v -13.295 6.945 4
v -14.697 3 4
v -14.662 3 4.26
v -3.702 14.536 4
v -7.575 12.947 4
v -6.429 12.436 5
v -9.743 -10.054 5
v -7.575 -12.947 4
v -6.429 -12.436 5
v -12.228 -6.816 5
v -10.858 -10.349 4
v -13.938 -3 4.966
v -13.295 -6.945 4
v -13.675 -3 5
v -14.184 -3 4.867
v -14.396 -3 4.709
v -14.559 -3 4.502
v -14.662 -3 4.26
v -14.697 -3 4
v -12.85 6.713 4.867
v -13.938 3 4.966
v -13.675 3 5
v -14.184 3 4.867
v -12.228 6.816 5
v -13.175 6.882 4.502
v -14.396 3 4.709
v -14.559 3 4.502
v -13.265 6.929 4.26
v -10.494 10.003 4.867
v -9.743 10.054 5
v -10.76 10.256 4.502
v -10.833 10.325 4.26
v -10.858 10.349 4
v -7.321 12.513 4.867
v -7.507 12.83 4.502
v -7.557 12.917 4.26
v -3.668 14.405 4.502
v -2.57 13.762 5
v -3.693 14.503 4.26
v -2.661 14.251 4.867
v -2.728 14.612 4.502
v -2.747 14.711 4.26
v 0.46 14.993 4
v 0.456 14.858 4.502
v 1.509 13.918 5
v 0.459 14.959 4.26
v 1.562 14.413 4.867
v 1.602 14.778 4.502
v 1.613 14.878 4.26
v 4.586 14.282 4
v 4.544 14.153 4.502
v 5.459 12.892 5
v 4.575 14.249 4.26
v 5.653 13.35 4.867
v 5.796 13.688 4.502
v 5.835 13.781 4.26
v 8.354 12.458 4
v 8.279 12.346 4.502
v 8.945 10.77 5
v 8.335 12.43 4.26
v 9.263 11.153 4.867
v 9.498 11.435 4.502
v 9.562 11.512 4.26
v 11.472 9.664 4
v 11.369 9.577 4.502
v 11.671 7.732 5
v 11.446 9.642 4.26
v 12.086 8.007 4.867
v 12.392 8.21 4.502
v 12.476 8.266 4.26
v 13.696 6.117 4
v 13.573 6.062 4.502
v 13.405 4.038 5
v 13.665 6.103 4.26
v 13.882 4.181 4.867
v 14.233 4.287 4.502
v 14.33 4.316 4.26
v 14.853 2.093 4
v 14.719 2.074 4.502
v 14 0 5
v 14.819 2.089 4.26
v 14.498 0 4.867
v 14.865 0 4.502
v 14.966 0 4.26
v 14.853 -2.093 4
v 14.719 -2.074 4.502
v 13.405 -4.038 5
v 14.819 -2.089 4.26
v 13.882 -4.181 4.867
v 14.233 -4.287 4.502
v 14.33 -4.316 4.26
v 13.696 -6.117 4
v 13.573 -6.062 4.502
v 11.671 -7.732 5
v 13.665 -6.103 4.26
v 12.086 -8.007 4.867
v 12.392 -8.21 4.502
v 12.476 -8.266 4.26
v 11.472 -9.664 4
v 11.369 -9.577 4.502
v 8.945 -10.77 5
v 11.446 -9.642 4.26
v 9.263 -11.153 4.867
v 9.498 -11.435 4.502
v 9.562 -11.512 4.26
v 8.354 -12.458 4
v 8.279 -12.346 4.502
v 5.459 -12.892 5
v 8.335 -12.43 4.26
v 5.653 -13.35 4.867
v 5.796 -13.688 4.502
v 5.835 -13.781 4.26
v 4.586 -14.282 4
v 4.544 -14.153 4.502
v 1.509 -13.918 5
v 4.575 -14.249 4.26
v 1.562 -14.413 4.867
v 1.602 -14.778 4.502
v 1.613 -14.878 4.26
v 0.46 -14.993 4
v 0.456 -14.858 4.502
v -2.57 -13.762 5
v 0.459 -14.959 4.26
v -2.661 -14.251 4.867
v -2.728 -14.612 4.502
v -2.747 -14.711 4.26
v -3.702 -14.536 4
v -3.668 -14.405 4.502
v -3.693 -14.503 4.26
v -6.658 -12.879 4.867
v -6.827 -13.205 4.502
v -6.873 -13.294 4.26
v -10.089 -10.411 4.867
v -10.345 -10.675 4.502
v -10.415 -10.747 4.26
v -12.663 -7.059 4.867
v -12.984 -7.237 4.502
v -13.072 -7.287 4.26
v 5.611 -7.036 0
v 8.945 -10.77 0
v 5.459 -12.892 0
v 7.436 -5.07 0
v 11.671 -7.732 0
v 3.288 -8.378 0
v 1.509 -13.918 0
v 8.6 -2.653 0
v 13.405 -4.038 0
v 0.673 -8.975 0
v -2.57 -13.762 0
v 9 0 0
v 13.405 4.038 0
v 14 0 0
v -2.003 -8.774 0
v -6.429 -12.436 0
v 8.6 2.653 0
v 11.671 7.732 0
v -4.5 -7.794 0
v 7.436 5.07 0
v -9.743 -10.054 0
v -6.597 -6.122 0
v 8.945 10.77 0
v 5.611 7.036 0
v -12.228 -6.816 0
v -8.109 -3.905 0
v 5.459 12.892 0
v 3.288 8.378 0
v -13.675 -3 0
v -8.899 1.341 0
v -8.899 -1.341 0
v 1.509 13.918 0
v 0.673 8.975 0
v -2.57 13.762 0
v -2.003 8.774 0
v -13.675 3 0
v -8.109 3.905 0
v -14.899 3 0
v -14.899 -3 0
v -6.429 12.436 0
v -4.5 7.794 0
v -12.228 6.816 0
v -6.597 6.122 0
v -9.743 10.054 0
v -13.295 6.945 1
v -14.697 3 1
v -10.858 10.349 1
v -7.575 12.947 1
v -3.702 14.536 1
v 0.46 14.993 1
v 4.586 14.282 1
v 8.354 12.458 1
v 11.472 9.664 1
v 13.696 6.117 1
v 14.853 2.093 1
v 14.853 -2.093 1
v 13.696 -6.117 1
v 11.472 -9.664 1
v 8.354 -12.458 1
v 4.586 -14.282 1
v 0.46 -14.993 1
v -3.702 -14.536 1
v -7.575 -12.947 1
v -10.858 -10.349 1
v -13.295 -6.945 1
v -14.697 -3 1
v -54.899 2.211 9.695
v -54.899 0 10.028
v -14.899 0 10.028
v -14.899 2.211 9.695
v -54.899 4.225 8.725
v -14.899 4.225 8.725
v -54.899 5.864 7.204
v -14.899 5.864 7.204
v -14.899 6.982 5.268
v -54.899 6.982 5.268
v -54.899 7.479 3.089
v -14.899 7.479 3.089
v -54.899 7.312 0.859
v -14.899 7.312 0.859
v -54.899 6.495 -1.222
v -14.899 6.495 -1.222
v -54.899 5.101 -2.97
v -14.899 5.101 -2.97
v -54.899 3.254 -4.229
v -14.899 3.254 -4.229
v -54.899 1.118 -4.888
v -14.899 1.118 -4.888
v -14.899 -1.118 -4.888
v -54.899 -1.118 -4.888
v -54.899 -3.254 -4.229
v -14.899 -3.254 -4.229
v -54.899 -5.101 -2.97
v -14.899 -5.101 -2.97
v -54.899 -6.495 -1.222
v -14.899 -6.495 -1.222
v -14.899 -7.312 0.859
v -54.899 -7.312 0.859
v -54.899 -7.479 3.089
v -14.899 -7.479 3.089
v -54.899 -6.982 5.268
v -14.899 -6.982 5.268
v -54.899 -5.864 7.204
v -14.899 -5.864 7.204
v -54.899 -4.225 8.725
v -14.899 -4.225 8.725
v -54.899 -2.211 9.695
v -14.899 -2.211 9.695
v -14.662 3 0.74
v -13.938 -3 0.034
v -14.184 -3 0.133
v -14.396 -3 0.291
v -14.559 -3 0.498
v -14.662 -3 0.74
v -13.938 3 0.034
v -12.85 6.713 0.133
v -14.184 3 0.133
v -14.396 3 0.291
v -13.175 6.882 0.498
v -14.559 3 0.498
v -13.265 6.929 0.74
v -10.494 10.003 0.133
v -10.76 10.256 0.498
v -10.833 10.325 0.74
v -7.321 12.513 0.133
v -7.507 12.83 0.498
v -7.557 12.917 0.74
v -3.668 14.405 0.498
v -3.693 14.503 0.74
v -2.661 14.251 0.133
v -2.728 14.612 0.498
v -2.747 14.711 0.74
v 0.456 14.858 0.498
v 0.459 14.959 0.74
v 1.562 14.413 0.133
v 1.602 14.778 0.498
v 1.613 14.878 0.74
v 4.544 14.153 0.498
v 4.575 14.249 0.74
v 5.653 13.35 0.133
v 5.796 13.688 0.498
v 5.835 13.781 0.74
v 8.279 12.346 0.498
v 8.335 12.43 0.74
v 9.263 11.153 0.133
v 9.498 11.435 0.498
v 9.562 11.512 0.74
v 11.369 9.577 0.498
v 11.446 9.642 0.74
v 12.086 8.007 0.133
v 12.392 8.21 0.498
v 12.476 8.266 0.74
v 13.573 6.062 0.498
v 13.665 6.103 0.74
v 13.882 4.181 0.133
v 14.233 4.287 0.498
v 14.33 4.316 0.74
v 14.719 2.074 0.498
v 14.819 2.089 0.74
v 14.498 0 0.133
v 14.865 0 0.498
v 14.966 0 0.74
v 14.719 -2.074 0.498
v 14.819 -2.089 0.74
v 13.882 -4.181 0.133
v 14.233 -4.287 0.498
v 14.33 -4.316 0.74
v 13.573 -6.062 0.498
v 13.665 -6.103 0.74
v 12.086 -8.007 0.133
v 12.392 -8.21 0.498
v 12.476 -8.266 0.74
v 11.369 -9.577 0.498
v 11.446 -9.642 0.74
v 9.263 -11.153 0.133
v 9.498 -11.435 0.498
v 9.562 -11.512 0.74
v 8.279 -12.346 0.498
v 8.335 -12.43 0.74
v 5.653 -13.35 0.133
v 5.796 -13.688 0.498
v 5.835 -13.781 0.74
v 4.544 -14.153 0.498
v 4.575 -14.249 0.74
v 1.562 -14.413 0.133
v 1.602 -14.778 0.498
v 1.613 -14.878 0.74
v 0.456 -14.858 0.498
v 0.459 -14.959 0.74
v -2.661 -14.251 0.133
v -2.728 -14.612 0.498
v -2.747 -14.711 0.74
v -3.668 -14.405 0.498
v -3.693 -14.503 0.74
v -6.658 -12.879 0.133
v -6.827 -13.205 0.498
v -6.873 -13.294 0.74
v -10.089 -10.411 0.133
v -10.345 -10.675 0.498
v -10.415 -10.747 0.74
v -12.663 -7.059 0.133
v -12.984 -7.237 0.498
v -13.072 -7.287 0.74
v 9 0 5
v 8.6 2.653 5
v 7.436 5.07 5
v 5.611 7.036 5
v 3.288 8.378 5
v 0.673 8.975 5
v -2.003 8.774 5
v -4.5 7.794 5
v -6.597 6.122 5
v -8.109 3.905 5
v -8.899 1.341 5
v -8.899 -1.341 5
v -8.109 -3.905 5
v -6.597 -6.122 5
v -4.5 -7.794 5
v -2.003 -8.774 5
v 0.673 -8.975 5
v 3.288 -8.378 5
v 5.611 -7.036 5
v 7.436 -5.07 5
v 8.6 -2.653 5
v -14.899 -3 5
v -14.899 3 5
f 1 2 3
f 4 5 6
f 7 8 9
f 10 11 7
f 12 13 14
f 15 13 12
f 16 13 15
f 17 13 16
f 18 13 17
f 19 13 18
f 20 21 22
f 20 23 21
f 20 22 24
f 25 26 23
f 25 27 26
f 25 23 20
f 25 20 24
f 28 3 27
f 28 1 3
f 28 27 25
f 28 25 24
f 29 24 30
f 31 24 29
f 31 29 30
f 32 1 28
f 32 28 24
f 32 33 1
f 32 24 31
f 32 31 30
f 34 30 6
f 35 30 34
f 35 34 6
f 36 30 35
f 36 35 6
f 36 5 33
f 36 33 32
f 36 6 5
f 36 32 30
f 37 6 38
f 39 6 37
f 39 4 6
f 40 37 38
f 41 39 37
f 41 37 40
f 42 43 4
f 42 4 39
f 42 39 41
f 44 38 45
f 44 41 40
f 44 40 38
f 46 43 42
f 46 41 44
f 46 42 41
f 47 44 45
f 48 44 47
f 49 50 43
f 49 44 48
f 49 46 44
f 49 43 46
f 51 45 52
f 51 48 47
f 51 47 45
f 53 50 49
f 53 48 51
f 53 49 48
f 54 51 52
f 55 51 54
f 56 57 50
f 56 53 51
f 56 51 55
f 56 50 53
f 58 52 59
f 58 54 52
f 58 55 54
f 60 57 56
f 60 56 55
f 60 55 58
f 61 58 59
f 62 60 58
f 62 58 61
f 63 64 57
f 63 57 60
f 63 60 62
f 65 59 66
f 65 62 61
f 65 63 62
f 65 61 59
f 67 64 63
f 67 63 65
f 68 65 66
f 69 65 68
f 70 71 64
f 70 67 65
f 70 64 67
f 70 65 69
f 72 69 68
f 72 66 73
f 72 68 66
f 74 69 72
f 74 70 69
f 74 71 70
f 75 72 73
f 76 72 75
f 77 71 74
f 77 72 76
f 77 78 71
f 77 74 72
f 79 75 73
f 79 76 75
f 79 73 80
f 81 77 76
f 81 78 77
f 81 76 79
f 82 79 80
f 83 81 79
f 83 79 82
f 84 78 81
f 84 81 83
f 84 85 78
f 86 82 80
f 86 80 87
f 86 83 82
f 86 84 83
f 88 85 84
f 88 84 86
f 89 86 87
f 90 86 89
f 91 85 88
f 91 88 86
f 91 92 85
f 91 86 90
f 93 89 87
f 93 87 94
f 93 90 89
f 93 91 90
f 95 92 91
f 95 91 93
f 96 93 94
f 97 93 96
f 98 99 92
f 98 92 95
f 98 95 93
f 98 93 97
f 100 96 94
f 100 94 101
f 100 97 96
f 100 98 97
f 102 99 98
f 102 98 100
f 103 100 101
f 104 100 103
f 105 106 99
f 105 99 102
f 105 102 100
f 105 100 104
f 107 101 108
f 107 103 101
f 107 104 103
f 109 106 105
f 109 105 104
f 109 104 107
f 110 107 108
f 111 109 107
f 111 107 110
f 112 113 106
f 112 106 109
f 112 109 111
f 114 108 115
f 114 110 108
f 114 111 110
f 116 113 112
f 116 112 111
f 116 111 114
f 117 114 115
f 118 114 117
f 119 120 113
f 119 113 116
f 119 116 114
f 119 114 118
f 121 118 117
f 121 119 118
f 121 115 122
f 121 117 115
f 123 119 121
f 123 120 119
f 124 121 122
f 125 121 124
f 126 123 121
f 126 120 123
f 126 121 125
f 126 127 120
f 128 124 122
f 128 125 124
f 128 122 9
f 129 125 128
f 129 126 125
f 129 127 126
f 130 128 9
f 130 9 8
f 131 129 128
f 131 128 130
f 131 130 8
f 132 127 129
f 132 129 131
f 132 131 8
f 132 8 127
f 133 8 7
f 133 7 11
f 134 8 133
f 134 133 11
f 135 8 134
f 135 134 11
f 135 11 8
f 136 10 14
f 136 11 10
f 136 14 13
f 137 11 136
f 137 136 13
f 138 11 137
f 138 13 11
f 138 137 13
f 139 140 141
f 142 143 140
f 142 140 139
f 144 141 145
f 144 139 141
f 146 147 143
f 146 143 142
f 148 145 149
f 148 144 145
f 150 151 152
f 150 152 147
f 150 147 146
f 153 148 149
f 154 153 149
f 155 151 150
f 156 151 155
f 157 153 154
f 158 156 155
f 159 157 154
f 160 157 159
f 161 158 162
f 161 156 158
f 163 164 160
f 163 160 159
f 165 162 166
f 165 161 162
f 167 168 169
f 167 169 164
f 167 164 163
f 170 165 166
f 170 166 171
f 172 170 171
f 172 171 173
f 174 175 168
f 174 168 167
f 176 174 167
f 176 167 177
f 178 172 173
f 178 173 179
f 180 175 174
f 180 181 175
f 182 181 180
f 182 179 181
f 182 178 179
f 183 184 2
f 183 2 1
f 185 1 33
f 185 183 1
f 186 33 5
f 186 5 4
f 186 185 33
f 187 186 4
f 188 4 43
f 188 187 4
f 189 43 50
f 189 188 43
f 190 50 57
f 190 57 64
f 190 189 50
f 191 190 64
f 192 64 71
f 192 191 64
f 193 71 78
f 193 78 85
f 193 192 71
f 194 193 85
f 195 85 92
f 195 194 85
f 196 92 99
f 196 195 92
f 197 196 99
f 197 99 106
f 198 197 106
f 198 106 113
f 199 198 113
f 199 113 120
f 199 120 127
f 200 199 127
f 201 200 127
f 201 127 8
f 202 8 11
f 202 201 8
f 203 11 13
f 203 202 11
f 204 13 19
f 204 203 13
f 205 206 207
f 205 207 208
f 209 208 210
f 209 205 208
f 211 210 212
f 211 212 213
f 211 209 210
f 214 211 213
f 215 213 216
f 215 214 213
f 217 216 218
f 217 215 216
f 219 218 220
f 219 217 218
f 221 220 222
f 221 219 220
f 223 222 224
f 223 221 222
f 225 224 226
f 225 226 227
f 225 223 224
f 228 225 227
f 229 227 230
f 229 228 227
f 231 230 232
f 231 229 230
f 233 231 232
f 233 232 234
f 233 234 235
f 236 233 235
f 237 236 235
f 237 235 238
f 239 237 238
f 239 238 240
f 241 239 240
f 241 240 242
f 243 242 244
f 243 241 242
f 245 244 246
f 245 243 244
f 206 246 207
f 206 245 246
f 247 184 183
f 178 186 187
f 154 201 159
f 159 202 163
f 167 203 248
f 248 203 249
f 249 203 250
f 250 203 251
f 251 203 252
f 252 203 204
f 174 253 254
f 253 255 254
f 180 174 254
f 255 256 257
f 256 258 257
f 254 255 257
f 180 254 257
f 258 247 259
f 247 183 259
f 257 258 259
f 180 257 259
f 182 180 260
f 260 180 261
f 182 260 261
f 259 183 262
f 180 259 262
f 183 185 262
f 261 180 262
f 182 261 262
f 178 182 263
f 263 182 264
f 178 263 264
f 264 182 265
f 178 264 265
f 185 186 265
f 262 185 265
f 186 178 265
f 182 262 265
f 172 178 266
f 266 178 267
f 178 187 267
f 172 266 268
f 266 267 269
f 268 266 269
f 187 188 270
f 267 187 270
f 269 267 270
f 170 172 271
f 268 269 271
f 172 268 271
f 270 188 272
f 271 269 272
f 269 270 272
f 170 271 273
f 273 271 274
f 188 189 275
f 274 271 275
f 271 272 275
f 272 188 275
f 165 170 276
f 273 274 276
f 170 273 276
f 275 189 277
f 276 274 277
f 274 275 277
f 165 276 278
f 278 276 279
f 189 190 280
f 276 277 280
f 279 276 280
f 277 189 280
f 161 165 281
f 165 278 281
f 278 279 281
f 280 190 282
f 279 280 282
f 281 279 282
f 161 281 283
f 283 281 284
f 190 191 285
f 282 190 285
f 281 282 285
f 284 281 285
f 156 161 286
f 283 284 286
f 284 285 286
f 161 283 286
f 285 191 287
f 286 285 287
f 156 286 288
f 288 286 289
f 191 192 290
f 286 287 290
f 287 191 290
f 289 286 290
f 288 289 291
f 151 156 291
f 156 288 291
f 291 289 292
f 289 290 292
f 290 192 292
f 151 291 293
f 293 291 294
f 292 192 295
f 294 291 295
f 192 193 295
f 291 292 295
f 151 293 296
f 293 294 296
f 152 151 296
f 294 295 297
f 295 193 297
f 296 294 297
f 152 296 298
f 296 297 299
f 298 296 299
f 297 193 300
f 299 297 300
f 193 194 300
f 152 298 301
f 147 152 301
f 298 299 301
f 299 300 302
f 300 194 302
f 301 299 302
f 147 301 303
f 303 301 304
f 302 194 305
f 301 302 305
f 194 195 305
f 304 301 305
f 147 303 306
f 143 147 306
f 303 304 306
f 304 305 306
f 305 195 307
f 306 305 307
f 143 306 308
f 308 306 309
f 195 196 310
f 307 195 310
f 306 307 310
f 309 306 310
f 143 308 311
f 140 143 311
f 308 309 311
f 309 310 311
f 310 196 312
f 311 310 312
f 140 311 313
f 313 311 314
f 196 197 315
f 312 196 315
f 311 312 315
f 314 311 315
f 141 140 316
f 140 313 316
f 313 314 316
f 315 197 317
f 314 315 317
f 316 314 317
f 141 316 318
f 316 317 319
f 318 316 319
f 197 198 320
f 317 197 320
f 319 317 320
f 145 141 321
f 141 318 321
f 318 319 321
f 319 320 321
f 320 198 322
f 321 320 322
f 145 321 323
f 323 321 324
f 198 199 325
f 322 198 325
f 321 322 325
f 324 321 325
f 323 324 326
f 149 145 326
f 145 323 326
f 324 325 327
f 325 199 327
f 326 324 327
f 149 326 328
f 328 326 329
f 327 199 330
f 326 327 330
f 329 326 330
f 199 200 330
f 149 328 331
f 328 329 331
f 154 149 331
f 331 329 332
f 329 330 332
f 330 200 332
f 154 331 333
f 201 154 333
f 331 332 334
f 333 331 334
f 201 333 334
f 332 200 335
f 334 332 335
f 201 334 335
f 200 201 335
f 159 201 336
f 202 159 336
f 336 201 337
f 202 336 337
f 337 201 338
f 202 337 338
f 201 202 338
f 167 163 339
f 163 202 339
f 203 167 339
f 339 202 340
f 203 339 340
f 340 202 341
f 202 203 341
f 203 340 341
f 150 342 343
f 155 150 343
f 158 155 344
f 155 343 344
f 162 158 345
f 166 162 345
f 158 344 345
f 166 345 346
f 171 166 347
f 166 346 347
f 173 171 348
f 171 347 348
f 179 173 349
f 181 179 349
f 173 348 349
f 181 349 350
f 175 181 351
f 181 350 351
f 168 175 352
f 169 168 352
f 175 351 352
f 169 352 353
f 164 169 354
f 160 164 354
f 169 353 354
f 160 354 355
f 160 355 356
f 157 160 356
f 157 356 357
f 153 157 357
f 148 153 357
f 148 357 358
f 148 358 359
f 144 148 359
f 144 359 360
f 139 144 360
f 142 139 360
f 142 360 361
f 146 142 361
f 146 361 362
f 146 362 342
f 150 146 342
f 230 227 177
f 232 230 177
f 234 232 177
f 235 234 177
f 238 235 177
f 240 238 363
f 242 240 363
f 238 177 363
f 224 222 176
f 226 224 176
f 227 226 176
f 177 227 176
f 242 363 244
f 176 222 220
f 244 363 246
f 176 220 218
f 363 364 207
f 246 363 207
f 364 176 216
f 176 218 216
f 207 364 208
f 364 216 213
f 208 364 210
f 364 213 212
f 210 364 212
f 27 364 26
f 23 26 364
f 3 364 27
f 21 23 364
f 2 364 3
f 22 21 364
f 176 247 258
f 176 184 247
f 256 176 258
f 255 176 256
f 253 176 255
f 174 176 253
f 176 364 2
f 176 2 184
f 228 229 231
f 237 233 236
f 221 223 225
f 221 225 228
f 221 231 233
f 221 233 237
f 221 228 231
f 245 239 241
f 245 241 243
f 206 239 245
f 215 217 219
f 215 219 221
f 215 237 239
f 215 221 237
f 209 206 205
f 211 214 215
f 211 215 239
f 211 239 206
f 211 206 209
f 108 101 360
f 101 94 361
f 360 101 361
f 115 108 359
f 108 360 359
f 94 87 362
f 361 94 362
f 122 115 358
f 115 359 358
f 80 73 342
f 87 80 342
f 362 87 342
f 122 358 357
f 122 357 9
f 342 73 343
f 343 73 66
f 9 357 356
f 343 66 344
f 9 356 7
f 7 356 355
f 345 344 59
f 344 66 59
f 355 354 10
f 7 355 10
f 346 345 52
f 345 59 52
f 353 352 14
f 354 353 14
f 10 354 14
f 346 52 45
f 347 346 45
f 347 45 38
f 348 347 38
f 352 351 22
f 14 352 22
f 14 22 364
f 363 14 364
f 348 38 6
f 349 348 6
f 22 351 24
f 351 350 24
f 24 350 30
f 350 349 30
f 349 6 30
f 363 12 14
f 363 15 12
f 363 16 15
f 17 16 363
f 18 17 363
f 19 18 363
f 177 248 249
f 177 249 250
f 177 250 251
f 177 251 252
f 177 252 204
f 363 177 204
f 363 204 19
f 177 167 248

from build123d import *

# Parameters (mm, degrees)
BOSS_EXTRUDE2_DEPTH = 5
SKETCH6_R           = 9
CUT_EXTRUDE1_DEPTH  = 58.130534293
FILLET2_R           = 1
SKETCH7_R           = 7.5
BOSS_EXTRUDE3_DEPTH = 40


with BuildPart() as part:
    # Sketch4 → Boss-Extrude2 (new body)
    with BuildSketch(Plane.XY):
        with BuildLine():
            Line((-54.898979486, -3), (-54.898979486, 3))
            Line((-54.898979486, 3), (-14.696938457, 3))
            ThreePointArc((-14.696938457, 3), (15, 0), (-14.696938457, -3))
            Line((-14.696938457, -3), (-54.898979486, -3))
        make_face()
    extrude(amount=BOSS_EXTRUDE2_DEPTH)

    # Sketch6 → Cut-Extrude1 (cut, through all)
    with BuildSketch(Plane.XY.offset(5)):
        Circle(SKETCH6_R)
    extrude(amount=-CUT_EXTRUDE1_DEPTH, mode=Mode.SUBTRACT)

    # Fillet2
    fillet2_edges = [part.edges().sort_by_distance(p)[0] for p in [
        (15, 0, 5),
        (15, 0, 0),
    ]]
    fillet(fillet2_edges, radius=FILLET2_R)

    # Sketch7 → Boss-Extrude3 (add)
    with BuildSketch(Plane.ZY.offset(54.898979486)):
        with Locations((2.528088008, 0)):
            Circle(SKETCH7_R)
    extrude(amount=-BOSS_EXTRUDE3_DEPTH)


solid = part.part
